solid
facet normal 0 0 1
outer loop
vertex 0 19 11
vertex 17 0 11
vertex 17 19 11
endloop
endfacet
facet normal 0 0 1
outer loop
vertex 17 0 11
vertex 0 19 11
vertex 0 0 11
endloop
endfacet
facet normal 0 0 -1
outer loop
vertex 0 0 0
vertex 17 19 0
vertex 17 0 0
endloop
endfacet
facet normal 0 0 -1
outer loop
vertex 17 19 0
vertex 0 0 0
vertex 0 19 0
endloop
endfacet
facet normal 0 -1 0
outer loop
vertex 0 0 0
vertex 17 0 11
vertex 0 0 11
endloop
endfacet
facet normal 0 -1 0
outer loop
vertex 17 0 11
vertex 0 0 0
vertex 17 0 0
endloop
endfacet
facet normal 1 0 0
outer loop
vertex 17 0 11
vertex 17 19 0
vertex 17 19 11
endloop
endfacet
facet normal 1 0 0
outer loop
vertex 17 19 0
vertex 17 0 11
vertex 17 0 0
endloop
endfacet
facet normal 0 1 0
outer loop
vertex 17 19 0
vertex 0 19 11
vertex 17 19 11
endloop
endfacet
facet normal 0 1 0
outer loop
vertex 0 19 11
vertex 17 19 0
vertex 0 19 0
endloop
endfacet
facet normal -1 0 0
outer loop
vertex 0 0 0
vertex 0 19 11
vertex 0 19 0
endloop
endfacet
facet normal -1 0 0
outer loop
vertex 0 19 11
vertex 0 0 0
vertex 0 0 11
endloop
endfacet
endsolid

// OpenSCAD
// Generated by SolidPython 1.0.1 on 2020-07-29 00:46:56


cube(size = [17, 19, 11]);
/***********************************************
*********      SolidPython code:      **********
************************************************
 
# import packages: SolidPython
from solid import *
from solid.utils import *
from itertools import chain, combinations, permutations


class Resize:

    def __init__(self, scad_file):
        self.scad_file = scad_file
        #self.scad_file = import_scad(scad_file)
        # cone/cylinder param:
        self.r1 = 0
        self.r2 = 0
        self.h = 0
        # rectangular prism param:
        self.w = 0
        self.l = 0
        # ellipse param:
        self.r = 0

    # import OpenScad code (file name corresponds to shape)


    # classify shape + parameters
    def assign(self, param1, param2, param3):
        if self.scad_file == 'cone.scad':
            self.r1 = param1
            self.r2 = param2
            self.h = param3
        elif self.scad_file == 'cylinder.scad':
            self.r1 = param1
            self.r2 = param2
            self.h = param3
        elif self.scad_file == 'rectangularPrism.scad':
            self.h = param1
            self.l = param2
            self.w = param3
        else:
            self.r = param1
            self.h = param2

    # resize parameters
    def iterate(self):
        x = range(3, 20, 2)
        i = 1
        if self.scad_file == 'cone.scad':
            tempList = list(permutations(x, 2))
            for temp in tempList:
                param1 = temp[0]
                param2 = temp[1]
                filepath = 'produced_scad_files/' + 'cone' + str(param1) + '_' + str(param2) + '_' + '.scad'
                scad_render_to_file(cylinder(h=param1, r1=param2, r2=0), filepath)

        elif self.scad_file == 'cylinder.scad':
            tempList = list(permutations(x, 3))
            for temp in tempList:
                param1 = temp[0]
                param2 = temp[1]
                filepath = 'produced_scad_files/' + 'cylinder' + str(param1) + '_' + str(param2) + '_' + '.scad'
                scad_render_to_file(cylinder(h=param1, r1=param2, r2=param2), filepath)

        elif self.scad_file == 'rectangularPrism.scad':
            tempList = list(permutations(x, 3))
            for temp in tempList:
                param1 = temp[0]
                param2 = temp[1]
                param3 = temp[2]
                filepath = 'produced_scad_files/' + 'rectangularPrism' + str(param1) + '_' + str(param2) + '_' + str(
                    param3) + '.scad'
                scad_render_to_file(cube(size=(param1, param2, param3)), filepath)

        elif self.scad_file == 'ellipse.scad':
            tempList = list(permutations(x, 4))
            for temp in tempList:
                param1 = temp[0]
                param2 = temp[1]
                param3 = temp[2]
                param4 = temp[3]
                filepath = 'produced_scad_files/' + 'ellipse' + str(param1) + '_' + str(param2) + '_' + str(param3) + '_' + str(param4) + '.scad'
                scad_render_to_file(scale([param1, param2, param3])(sphere(r=param4)), filepath)

    def render_to_scadfile(self):
        scad_render_to_file(scad, 'example.scad') 
 
************************************************/
